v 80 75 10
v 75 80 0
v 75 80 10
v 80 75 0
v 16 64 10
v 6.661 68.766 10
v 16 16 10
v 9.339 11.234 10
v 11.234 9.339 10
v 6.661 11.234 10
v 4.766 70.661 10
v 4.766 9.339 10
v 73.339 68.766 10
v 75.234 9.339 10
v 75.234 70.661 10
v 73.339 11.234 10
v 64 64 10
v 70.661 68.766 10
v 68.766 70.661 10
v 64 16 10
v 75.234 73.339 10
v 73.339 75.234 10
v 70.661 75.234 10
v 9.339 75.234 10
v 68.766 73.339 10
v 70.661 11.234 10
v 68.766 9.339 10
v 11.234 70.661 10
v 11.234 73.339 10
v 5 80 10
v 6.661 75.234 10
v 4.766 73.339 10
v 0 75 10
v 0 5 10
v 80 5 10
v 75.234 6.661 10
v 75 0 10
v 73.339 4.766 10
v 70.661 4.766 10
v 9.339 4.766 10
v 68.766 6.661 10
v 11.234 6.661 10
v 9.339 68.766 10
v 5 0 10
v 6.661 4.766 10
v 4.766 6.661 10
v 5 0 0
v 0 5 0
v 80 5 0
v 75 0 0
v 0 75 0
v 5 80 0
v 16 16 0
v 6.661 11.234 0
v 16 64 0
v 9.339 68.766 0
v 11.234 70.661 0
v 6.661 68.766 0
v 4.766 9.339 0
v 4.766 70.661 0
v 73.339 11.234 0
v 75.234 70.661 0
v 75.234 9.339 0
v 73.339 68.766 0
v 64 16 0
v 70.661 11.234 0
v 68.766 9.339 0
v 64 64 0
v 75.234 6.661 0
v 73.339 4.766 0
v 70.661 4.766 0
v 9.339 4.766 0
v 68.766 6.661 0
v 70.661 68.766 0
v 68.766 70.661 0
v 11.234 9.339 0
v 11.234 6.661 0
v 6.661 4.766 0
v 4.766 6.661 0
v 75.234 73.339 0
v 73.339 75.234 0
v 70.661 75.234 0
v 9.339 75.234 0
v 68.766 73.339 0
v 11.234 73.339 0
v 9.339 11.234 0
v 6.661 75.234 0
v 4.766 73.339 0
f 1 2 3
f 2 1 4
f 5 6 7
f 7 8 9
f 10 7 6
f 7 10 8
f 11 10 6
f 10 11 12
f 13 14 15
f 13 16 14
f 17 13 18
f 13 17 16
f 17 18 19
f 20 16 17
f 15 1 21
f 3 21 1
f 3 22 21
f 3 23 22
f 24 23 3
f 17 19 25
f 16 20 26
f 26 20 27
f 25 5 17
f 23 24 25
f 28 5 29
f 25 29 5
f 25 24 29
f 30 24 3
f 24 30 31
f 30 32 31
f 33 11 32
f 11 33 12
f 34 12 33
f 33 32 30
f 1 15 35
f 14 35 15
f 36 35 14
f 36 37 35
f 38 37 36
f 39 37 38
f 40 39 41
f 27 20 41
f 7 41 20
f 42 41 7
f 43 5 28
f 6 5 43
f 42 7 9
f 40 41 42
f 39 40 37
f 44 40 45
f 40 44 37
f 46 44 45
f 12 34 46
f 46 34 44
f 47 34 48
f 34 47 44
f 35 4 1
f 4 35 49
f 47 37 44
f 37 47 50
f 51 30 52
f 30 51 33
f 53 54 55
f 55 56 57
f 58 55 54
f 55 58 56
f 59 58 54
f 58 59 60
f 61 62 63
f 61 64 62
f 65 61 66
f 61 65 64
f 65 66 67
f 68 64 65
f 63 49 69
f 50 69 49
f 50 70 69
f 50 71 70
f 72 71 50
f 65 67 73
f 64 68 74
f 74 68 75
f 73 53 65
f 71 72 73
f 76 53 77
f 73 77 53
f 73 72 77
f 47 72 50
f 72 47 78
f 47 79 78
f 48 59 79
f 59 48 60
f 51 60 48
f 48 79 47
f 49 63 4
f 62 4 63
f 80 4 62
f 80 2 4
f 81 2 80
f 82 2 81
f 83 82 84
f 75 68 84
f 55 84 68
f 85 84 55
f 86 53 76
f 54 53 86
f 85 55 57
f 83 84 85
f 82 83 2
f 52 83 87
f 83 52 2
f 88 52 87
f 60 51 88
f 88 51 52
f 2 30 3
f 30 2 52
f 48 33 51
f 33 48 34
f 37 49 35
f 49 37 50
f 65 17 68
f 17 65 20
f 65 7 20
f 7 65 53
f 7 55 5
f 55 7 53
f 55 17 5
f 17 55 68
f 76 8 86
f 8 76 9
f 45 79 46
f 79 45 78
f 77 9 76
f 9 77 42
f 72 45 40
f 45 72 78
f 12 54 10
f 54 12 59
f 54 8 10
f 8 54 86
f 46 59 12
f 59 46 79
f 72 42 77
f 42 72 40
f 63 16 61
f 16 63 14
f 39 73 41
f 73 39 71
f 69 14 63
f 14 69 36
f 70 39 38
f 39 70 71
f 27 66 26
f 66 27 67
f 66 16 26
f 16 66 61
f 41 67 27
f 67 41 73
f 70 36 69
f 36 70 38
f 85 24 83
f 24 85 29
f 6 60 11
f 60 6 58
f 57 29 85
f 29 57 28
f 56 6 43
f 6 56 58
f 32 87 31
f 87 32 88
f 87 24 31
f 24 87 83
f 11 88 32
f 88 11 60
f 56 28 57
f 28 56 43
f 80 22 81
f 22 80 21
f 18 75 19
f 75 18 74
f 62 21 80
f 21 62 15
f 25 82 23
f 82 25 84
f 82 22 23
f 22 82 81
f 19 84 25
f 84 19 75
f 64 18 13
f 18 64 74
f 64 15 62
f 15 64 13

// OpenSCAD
$fn = 32;

// ----------------------------------------------------------------------
// Frame plate: 80 x 80 frame, 16 mm rails
// ----------------------------------------------------------------------

// --- parameters (mm) ---
plate_l = 80;             // plate length, X
plate_w = 80;             // plate width, Y
plate_t = 10;             // plate thickness, Z (extrusion height)
corner_c = 5;             // corner chamfer
frame_bar = 16;           // frame rail width
bolt_r = 3.5;             // corner bolt window radius
bolt_inset = 8;           // bolt centre inset from the edges

win_l = plate_l - 2 * frame_bar;  // window length
win_w = plate_w - 2 * frame_bar;  // window width
bolt_d = 2 * bolt_r;  // corner hole diameter

profile = [[5, 0], [75, 0], [80, 5], [80, 75], [75, 80], [5, 80], [0, 75], [0, 5]];  // primary outline, 8 points, counter clockwise
void_1 = [[16, 16], [64, 16], [64, 64], [16, 64]];  // the window, 4 points
void_2 = [[11.234, 9.339], [9.339, 11.234], [6.661, 11.234], [4.766, 9.339], [4.766, 6.661], [6.661, 4.766], [9.339, 4.766], [11.234, 6.661]];  // corner bolt window, 8 points
void_3 = [[75.234, 9.339], [73.339, 11.234], [70.661, 11.234], [68.766, 9.339], [68.766, 6.661], [70.661, 4.766], [73.339, 4.766], [75.234, 6.661]];  // corner bolt window, 8 points
void_4 = [[11.234, 73.339], [9.339, 75.234], [6.661, 75.234], [4.766, 73.339], [4.766, 70.661], [6.661, 68.766], [9.339, 68.766], [11.234, 70.661]];  // corner bolt window, 8 points
void_5 = [[75.234, 73.339], [73.339, 75.234], [70.661, 75.234], [68.766, 73.339], [68.766, 70.661], [70.661, 68.766], [73.339, 68.766], [75.234, 70.661]];  // corner bolt window, 8 points

// --- the one profile operation ---
difference() {
  linear_extrude(height = plate_t) polygon(points = profile);
  translate([0, 0, -1])
    linear_extrude(height = plate_t + 2) polygon(points = void_1);
  translate([0, 0, -1])
    linear_extrude(height = plate_t + 2) polygon(points = void_2);
  translate([0, 0, -1])
    linear_extrude(height = plate_t + 2) polygon(points = void_3);
  translate([0, 0, -1])
    linear_extrude(height = plate_t + 2) polygon(points = void_4);
  translate([0, 0, -1])
    linear_extrude(height = plate_t + 2) polygon(points = void_5);
}
